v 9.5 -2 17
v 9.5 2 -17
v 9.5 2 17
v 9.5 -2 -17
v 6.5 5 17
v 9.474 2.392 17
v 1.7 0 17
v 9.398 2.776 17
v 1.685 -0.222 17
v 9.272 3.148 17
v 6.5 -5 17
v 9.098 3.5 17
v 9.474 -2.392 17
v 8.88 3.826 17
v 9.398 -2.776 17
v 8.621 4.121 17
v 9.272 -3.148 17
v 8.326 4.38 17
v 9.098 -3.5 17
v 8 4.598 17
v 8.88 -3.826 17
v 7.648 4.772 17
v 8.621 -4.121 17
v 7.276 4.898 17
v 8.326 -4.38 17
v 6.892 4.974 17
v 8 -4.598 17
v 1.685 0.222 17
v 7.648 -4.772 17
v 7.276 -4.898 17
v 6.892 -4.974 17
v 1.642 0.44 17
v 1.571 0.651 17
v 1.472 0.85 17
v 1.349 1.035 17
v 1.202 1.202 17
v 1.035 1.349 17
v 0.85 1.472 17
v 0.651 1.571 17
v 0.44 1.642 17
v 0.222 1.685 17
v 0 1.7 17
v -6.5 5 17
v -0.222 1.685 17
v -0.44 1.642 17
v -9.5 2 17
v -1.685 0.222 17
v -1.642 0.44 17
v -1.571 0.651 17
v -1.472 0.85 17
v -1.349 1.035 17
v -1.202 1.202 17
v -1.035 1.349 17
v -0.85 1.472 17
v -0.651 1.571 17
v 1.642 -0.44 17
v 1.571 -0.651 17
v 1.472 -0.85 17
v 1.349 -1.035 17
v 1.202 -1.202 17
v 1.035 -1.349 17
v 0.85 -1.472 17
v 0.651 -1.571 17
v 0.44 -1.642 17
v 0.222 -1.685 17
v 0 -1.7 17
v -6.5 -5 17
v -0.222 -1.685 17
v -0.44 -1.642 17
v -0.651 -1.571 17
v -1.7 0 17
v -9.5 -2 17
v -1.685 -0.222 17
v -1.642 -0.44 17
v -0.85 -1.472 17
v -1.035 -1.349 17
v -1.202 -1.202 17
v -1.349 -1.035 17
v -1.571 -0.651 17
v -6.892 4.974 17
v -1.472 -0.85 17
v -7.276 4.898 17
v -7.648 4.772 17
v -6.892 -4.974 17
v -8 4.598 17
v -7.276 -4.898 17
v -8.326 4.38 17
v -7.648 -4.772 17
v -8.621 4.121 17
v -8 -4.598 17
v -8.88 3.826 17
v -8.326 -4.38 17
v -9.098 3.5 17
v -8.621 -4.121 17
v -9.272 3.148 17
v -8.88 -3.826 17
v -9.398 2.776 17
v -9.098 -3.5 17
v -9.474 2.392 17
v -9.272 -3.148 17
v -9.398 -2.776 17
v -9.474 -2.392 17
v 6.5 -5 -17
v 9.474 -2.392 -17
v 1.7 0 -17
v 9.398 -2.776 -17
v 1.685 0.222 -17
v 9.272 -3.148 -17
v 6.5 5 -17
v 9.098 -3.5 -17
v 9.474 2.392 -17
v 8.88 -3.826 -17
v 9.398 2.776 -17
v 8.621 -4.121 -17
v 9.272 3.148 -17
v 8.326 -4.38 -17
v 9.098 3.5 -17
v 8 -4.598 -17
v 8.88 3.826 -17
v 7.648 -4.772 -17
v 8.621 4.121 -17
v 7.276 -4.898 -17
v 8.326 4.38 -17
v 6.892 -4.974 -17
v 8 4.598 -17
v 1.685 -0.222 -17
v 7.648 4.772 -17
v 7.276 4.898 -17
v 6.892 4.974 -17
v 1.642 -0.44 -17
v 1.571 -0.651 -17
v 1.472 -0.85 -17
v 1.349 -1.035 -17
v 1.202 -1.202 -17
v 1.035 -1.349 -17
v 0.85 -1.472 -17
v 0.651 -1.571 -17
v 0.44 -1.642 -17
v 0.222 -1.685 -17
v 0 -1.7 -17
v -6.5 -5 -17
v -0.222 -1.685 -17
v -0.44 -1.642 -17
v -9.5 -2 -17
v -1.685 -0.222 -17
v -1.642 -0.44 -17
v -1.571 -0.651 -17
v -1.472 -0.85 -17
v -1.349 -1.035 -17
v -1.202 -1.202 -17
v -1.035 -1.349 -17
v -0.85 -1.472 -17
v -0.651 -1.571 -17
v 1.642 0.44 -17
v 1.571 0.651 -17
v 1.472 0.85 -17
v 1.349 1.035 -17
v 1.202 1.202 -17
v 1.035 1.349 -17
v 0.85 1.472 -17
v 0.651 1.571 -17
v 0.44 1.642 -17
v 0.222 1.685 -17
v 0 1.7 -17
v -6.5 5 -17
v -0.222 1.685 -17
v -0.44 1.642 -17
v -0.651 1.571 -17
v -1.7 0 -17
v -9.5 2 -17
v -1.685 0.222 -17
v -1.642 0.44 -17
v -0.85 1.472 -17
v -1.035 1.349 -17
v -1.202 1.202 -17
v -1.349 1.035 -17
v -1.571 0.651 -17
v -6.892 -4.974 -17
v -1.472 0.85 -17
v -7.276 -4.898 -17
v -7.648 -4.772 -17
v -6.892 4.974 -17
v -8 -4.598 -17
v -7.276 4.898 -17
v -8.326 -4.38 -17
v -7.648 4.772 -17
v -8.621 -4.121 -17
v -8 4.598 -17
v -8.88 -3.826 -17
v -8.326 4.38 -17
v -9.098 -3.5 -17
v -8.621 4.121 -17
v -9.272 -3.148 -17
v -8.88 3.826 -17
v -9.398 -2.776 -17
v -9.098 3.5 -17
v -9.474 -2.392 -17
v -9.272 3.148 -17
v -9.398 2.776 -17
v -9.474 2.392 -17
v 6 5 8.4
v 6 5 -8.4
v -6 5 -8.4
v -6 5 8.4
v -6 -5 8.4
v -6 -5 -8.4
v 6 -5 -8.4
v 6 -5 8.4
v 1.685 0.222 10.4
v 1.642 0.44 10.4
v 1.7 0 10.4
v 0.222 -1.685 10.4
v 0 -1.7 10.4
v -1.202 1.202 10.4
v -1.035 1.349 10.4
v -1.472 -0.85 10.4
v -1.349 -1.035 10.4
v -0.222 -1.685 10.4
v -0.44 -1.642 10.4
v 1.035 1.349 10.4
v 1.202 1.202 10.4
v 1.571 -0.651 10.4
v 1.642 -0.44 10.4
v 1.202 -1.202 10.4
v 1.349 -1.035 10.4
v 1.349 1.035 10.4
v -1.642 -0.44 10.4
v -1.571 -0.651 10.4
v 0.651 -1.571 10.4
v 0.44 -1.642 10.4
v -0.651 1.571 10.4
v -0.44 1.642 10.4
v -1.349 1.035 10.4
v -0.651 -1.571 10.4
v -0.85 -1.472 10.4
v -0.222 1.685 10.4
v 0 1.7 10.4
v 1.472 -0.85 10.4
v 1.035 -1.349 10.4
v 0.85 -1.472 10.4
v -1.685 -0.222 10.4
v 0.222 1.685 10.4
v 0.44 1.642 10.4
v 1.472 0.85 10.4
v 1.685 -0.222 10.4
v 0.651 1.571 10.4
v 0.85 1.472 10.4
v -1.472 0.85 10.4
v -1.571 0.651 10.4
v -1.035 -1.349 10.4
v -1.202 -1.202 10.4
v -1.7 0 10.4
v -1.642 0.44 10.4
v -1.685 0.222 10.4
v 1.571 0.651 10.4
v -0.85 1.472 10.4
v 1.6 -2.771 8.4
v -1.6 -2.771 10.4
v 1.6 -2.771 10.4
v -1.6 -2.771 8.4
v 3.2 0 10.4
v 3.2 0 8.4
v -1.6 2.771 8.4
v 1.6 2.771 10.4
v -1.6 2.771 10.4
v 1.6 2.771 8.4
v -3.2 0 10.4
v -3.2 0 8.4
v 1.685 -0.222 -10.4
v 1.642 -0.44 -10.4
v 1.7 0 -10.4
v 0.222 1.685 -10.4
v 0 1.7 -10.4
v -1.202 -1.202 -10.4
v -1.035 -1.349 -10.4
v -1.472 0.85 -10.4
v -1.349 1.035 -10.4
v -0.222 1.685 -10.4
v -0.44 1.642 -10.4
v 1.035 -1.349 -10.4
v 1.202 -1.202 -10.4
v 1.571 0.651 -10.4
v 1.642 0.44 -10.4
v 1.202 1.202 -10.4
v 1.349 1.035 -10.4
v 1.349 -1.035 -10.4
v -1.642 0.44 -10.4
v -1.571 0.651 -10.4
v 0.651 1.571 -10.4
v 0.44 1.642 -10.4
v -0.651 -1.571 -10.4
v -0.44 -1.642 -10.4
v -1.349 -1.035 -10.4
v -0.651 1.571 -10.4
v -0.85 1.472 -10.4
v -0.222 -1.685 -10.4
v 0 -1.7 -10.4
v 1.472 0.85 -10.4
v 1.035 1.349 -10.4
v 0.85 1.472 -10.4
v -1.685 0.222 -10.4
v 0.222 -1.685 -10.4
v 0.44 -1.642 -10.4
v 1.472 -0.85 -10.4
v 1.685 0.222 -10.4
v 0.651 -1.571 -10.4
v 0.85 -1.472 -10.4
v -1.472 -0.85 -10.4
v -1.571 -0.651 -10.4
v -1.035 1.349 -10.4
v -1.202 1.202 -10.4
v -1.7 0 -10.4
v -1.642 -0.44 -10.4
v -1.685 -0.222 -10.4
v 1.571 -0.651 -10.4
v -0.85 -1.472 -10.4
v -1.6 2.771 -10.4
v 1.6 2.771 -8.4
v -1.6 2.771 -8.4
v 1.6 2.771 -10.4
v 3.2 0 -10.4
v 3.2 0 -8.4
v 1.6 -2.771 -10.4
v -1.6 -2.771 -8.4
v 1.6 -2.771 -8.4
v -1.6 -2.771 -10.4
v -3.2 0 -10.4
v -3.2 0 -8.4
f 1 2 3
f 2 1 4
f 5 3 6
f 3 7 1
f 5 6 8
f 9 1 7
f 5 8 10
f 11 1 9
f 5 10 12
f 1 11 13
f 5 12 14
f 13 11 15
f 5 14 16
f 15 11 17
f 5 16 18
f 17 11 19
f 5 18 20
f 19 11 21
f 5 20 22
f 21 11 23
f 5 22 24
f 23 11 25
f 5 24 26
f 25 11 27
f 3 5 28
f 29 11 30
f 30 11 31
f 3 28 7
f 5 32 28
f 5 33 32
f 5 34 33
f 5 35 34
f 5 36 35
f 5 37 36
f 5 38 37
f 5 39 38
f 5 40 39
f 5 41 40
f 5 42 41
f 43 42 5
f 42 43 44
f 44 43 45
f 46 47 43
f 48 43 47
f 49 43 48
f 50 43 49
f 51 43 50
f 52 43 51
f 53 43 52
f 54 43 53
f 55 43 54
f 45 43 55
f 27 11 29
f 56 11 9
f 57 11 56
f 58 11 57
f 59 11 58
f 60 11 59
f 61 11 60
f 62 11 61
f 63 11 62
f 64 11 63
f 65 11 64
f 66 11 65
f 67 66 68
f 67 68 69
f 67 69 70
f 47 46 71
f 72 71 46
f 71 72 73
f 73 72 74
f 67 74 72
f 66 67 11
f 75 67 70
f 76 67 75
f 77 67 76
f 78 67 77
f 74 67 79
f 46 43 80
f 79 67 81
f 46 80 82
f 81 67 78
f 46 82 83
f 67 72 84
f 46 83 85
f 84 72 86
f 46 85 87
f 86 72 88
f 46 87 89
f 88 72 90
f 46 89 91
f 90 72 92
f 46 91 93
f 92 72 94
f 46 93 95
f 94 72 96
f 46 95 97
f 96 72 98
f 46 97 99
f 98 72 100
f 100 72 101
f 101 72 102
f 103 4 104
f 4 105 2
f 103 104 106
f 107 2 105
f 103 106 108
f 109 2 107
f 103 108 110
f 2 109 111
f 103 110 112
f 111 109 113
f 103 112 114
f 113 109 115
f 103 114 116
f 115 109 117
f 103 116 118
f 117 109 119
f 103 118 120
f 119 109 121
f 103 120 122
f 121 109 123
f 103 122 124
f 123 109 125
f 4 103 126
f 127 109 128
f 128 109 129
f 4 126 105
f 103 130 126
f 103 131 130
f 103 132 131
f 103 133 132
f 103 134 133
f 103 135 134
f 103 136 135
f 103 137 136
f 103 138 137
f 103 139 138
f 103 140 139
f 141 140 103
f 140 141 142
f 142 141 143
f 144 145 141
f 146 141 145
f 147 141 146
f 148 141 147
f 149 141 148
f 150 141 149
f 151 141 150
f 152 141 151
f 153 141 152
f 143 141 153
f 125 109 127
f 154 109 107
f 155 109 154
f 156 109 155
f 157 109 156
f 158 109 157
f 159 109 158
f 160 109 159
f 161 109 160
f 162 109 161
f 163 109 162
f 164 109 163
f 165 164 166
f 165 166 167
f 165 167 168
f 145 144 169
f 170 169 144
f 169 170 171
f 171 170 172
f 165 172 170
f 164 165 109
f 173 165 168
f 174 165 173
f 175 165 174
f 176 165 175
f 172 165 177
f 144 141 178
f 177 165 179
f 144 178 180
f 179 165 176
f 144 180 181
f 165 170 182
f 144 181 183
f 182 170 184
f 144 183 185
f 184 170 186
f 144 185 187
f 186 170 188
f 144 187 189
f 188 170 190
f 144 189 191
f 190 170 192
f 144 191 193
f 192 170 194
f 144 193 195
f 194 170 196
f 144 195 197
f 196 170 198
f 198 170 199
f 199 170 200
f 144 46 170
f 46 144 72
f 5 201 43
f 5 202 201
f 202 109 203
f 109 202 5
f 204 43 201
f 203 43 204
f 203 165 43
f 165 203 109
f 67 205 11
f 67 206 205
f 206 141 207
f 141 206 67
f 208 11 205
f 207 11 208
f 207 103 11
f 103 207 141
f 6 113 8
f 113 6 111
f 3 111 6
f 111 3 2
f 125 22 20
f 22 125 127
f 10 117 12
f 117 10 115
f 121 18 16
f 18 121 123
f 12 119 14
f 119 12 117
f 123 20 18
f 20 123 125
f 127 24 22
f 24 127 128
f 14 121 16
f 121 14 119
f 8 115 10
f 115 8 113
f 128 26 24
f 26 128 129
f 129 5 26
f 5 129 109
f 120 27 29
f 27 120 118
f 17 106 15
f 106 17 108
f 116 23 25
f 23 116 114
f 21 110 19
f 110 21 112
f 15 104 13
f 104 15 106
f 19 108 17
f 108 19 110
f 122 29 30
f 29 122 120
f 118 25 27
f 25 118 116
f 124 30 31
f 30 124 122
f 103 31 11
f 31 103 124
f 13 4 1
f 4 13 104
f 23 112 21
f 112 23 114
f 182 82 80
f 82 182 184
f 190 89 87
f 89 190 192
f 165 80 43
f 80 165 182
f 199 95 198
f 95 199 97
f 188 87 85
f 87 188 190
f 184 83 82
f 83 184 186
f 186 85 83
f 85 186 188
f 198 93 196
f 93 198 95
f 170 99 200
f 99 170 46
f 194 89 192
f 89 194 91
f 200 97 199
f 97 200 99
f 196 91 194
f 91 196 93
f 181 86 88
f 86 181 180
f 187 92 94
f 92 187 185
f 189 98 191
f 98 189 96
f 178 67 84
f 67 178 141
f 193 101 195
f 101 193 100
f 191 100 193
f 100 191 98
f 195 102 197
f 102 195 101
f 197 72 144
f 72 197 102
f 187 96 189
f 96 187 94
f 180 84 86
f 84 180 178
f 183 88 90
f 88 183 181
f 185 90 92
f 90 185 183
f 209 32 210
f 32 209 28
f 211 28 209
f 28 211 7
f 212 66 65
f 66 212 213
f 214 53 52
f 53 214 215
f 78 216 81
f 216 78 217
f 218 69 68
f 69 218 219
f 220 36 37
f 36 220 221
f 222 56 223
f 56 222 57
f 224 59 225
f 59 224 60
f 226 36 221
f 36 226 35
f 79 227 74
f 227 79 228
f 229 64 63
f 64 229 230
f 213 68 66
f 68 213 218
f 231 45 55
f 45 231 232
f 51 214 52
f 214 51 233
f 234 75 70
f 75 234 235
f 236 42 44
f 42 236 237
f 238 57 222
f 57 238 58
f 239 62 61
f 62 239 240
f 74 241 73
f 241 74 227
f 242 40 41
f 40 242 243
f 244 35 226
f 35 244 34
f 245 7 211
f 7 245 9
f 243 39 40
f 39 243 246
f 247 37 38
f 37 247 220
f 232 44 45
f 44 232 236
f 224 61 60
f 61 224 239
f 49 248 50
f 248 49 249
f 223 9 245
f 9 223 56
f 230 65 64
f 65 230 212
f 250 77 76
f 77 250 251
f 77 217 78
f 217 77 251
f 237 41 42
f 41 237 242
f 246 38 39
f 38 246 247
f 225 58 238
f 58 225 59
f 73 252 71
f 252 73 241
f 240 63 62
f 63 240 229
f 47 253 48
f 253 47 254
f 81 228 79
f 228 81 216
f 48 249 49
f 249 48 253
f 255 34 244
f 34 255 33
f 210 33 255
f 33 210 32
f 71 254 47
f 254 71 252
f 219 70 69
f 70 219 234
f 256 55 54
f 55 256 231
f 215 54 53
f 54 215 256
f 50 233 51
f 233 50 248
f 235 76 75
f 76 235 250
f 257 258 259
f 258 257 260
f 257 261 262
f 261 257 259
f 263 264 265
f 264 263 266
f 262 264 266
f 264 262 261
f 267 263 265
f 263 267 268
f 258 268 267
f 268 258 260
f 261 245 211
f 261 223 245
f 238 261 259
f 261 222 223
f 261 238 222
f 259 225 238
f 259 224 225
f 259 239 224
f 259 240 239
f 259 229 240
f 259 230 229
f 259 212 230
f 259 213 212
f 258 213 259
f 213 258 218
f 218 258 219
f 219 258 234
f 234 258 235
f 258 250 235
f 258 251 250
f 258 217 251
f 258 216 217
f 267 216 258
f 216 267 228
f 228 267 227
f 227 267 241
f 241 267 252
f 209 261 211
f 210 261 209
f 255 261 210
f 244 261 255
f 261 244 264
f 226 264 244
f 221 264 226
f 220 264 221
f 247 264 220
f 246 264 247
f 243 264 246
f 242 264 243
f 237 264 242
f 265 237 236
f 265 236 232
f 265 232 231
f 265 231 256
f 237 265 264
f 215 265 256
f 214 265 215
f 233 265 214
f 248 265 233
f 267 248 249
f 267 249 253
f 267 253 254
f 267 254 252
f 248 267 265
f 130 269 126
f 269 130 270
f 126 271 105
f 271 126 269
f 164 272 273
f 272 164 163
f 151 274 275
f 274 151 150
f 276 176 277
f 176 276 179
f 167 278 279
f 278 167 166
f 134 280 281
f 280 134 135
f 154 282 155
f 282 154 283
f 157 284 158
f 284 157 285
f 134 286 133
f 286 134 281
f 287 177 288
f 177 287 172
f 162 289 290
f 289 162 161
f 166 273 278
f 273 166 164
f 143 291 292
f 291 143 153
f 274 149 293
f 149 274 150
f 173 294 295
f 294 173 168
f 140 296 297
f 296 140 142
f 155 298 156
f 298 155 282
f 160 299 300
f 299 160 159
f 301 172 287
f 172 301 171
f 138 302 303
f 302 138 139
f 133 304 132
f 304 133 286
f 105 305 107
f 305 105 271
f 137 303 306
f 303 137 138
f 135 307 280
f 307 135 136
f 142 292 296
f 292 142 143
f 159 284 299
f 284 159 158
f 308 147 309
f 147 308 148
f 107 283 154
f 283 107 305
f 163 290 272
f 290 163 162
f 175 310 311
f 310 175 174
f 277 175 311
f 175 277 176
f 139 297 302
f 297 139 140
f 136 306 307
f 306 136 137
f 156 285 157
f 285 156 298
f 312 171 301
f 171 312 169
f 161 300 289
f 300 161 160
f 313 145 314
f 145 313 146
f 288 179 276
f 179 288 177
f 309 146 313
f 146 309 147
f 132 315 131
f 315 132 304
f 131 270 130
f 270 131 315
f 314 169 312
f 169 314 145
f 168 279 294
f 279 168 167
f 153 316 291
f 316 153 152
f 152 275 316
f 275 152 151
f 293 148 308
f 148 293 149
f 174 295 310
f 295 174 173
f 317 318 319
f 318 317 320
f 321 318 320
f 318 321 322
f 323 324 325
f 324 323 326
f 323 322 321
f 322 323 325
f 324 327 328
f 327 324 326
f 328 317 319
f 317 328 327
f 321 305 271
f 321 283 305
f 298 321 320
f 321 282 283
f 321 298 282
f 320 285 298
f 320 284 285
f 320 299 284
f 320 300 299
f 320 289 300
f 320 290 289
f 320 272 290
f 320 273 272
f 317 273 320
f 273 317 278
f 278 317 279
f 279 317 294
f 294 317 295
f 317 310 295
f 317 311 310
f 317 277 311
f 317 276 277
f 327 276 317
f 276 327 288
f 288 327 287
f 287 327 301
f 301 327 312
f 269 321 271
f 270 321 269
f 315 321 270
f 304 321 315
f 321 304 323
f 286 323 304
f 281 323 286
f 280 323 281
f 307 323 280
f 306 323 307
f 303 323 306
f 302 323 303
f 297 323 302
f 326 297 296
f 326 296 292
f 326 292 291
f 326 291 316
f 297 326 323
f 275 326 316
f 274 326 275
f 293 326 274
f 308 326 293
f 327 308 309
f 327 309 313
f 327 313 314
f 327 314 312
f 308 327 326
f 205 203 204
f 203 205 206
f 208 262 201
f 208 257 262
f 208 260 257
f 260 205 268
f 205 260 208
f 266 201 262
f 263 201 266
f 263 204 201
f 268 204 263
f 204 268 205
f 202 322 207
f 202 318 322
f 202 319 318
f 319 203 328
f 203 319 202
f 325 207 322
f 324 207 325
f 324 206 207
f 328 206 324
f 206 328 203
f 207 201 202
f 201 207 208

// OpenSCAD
// file: misc_parts_inc.scad
M3_screw_hole_dia = 3.4;
M3_nut_hole_dia   = 6.2+0.2;

M4_screw_hole_dia = 4.4;
M4_nut_hole_dia   = 7.7+0.2;

M5_screw_hole_dia = 5.4;
M5_nut_hole_dia   = 9.0+0.9;
// file: misc_parts.scad
/*
Info: 
This lib contains things like screws, nuts and bearings.

Improvement:
- wasn't there before

TODO: 
- differentiate between parts that get substracted and normal parts (different diameters)

*/

include <misc_parts_inc.scad>

module screw_M3(length) 
{
    cylinder(d=M3_screw_hole_dia, h=length);
	cylinder(d=M3_nut_hole_dia, h=2.3, center=true, $fn=6);
}
screw_M3(10);

module screw_M4(length) 
{
    cylinder(d=M4_screw_hole_dia, h=length);
	cylinder(d=M4_nut_hole_dia, h=3.3, center=true, $fn=6);
}
translate([0,10,0]) screw_M4(10);

module screw_M5(length) 
{
    cylinder(d=M5_screw_hole_dia, h=length);
	cylinder(d=M5_nut_hole_dia, h=4.0, center=true, $fn=6);
}

translate([20,10,0]) screw_M5(10);

// Bearing - inner Diameter, outer diameter, width
module bearing(ID,OD,W) 
{
    translate([0,0,W/2]) difference() 
    {
        cylinder(d=OD, h=W, center=true);
        cylinder(d=ID, h=W+1, center=true);
    }
}
translate([0,30,0]) bearing(5,16,5);


// unregular cube
// 4 of the 12 edges are rounded
module round_cuboid(x,y,z,r,$fn=48) 
{
    cube([x,y-2*r,z],center=true);
    cube([x-2*r,y,z],center=true);
    cube([x-2*r,y-2*r,z],center=true);
    
    translate([+x/2-r,+y/2-r,0]) cylinder(r=r,h=z,center=true);
    translate([+x/2-r,-y/2+r,0]) cylinder(r=r,h=z,center=true);
    translate([-x/2+r,+y/2-r,0]) cylinder(r=r,h=z,center=true);
    translate([-x/2+r,-y/2+r,0]) cylinder(r=r,h=z,center=true);
}   
translate([0,50,0]) round_cuboid(x=19,y=10,z=30,r=3);

// unregular cube
// all 12 edges are rounded
module round_cuboid3(x,y,z,r,$fn=48) 
{
    cube([x,y-2*r,z-2*r],center=true);
    cube([x-2*r,y,z-2*r],center=true);
    cube([x-2*r,y-2*r,z],center=true);
    
    translate([+x/2-r,+y/2-r,0]) cylinder(r=r,h=z-2*r,center=true);
    translate([+x/2-r,-y/2+r,0]) cylinder(r=r,h=z-2*r,center=true);
    translate([-x/2+r,+y/2-r,0]) cylinder(r=r,h=z-2*r,center=true);
    translate([-x/2+r,-y/2+r,0]) cylinder(r=r,h=z-2*r,center=true);

    translate([+x/2-r,0,+z/2-r]) rotate([90,0,0]) cylinder(r=r,h=y-2*r,center=true);
    translate([+x/2-r,0,-z/2+r]) rotate([90,0,0]) cylinder(r=r,h=y-2*r,center=true);
    translate([-x/2+r,0,+z/2-r]) rotate([90,0,0]) cylinder(r=r,h=y-2*r,center=true);
    translate([-x/2+r,0,-z/2+r]) rotate([90,0,0]) cylinder(r=r,h=y-2*r,center=true);
    
    translate([0,+y/2-r,+z/2-r]) rotate([0,90,0]) cylinder(r=r,h=x-2*r,center=true);
    translate([0,+y/2-r,-z/2+r]) rotate([0,90,0]) cylinder(r=r,h=x-2*r,center=true);
    translate([0,-y/2+r,+z/2-r]) rotate([0,90,0]) cylinder(r=r,h=x-2*r,center=true);
    translate([0,-y/2+r,-z/2+r]) rotate([0,90,0]) cylinder(r=r,h=x-2*r,center=true);
    
    translate([+(x/2-r),+(y/2-r),+(z/2-r)]) sphere(r=r);
    translate([+(x/2-r),+(y/2-r),-(z/2-r)]) sphere(r=r);
    translate([+(x/2-r),-(y/2-r),+(z/2-r)]) sphere(r=r);
    translate([+(x/2-r),-(y/2-r),-(z/2-r)]) sphere(r=r);
    translate([-(x/2-r),+(y/2-r),+(z/2-r)]) sphere(r=r);
    translate([-(x/2-r),+(y/2-r),-(z/2-r)]) sphere(r=r);
    translate([-(x/2-r),-(y/2-r),+(z/2-r)]) sphere(r=r);
    translate([-(x/2-r),-(y/2-r),-(z/2-r)]) sphere(r=r);
}

translate([0,70,0]) round_cuboid3(20,10,15,2);
// main file
/*
Two of these spacers are placed between platform and hotend-mount.

Improvement: 
- offers an offset for the hotend-mount
- the fan of the E3D-Hotend fits between mount and platform 

TODO:
-
*/

$fn=48;
use <misc_parts.scad>

module mount_spacer()
{
    difference() 
    {
        round_cuboid(x=19,y=10,z=34,r=3);
        cylinder(d=3,h=40,center=true);
        scale([1,1,1.4]) rotate([90,0,0]) cube([12,12,20],center=true);
//        scale([1,1,1.4]) rotate([90,0,0]) cylinder(d=12,h=20,center=true);
        translate([0,0,2.3/2+6*1.4-0.3]) screw_M3(10);
        
        rotate([180,0,0]) translate([0,0,2.3/2+6*1.4-0.3]) screw_M3(10);
    }
}

mount_spacer();
//translate([0,0,2.3/2+6*1.4-0.3]) screw_M3(10);
